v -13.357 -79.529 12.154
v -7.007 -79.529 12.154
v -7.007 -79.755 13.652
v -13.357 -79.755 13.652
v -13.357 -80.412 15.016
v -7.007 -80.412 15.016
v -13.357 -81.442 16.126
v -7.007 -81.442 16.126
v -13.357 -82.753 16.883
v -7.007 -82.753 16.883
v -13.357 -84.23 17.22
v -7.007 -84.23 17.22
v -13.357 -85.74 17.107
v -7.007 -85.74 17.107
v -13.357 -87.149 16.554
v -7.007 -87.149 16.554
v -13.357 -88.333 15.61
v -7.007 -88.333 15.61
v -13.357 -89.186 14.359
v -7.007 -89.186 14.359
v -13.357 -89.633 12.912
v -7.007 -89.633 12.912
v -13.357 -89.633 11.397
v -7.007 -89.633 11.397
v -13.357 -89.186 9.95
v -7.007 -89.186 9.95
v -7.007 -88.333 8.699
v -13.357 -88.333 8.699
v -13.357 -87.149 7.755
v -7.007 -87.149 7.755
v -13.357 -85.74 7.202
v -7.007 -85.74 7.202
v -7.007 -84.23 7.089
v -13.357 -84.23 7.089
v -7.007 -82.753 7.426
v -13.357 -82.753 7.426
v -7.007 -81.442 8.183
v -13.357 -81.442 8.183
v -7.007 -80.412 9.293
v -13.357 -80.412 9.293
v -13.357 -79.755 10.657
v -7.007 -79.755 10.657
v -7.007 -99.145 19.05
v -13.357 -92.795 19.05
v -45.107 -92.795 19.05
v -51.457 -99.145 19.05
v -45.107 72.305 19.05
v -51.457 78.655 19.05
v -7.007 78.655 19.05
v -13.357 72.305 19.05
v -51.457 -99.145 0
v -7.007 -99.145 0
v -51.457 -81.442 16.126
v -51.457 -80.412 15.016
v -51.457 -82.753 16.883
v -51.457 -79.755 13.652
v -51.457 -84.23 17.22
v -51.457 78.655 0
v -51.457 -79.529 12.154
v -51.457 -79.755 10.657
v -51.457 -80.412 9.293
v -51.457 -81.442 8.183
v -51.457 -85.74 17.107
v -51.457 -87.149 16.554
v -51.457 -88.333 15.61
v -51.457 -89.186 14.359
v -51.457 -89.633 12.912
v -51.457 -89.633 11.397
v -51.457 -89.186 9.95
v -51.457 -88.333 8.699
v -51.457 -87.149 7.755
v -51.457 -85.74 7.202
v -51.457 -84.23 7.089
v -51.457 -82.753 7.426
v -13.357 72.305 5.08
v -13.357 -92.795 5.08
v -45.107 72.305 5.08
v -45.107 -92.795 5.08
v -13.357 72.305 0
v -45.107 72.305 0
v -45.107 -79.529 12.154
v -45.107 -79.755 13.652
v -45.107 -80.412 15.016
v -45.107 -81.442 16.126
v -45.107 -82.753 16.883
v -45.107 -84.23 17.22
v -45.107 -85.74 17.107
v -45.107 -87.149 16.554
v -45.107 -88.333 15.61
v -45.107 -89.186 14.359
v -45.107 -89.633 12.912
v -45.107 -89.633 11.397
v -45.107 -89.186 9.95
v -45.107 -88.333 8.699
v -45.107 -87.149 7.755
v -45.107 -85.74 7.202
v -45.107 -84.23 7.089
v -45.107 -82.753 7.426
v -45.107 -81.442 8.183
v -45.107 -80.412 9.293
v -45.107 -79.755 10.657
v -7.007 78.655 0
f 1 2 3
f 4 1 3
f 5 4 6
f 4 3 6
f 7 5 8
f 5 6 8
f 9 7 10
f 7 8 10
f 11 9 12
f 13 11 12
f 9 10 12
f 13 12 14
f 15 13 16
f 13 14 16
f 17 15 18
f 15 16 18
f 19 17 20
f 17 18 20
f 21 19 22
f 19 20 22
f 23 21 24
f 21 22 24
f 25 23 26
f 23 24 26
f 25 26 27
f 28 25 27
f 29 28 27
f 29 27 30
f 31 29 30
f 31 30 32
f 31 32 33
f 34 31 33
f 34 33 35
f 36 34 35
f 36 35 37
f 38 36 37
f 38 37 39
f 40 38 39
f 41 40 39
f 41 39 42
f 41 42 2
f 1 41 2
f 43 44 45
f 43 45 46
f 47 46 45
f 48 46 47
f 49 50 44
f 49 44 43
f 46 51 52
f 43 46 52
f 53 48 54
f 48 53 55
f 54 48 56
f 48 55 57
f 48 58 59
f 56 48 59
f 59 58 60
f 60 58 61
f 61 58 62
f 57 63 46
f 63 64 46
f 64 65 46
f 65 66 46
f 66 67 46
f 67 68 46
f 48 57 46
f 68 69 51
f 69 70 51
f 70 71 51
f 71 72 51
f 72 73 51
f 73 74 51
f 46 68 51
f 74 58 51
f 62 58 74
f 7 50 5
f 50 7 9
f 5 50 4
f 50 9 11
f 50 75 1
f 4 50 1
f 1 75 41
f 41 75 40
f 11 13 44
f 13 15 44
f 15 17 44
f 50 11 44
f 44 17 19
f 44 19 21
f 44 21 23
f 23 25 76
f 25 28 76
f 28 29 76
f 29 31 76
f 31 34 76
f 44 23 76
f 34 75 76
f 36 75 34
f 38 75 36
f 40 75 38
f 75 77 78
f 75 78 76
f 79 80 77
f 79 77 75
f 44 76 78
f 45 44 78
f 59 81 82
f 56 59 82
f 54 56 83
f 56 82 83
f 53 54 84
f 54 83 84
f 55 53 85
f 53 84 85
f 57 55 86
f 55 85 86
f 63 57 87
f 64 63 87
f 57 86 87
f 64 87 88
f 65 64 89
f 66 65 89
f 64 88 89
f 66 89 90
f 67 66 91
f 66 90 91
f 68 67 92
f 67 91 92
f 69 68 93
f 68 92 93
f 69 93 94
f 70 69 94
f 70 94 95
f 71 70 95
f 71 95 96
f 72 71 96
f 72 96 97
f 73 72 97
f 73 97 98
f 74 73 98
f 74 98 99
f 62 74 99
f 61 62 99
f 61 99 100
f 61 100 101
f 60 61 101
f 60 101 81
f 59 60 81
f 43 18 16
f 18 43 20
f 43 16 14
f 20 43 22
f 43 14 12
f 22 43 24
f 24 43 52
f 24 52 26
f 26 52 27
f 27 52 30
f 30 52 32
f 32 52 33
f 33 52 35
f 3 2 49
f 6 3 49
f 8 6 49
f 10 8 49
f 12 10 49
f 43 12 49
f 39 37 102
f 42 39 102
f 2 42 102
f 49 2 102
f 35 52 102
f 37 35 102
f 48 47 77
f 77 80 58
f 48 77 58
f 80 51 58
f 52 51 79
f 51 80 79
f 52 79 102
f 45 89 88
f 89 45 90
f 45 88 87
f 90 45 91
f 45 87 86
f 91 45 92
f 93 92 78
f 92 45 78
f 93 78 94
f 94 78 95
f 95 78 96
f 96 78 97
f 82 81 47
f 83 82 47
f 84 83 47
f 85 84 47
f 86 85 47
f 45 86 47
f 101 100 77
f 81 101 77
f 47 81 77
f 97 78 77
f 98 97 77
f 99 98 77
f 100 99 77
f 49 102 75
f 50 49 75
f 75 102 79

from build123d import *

# Parameters (mm, degrees)
F0_W     = 31.75
F0_H     = 165.1
F1_DEPTH = 5.08
F2_DEPTH = 19.05
F3_R     = 5.08
F4_DEPTH = 45.72


with BuildPart() as f1:
    # F0 (on Top) → F1 (new body)
    with BuildSketch(Plane.XY):
        with Locations((-29.231615, -10.24527)):
            Rectangle(F0_W, F0_H)
    extrude(amount=F1_DEPTH)

    # F0 (on Top) → F2 (join)
    with BuildSketch(Plane.XY):
        Polygon((-45.106615, -92.79527), (-45.106615, 72.30473), (-51.456615, 78.65473), (-51.456615, -99.14527), (-7.006615, -99.14527), (-7.006615, 78.65473), (-13.356615, 72.30473), (-13.356615, -92.79527), align=None)
    extrude(amount=F2_DEPTH)

    # F3 (on face) → F4 (cut)
    with BuildSketch(Plane.YZ.offset(-7.006615)):
        with Locations((-84.609412, 12.154419)):
            Circle(F3_R)
    extrude(amount=-F4_DEPTH, mode=Mode.SUBTRACT)


solid = f1.part
